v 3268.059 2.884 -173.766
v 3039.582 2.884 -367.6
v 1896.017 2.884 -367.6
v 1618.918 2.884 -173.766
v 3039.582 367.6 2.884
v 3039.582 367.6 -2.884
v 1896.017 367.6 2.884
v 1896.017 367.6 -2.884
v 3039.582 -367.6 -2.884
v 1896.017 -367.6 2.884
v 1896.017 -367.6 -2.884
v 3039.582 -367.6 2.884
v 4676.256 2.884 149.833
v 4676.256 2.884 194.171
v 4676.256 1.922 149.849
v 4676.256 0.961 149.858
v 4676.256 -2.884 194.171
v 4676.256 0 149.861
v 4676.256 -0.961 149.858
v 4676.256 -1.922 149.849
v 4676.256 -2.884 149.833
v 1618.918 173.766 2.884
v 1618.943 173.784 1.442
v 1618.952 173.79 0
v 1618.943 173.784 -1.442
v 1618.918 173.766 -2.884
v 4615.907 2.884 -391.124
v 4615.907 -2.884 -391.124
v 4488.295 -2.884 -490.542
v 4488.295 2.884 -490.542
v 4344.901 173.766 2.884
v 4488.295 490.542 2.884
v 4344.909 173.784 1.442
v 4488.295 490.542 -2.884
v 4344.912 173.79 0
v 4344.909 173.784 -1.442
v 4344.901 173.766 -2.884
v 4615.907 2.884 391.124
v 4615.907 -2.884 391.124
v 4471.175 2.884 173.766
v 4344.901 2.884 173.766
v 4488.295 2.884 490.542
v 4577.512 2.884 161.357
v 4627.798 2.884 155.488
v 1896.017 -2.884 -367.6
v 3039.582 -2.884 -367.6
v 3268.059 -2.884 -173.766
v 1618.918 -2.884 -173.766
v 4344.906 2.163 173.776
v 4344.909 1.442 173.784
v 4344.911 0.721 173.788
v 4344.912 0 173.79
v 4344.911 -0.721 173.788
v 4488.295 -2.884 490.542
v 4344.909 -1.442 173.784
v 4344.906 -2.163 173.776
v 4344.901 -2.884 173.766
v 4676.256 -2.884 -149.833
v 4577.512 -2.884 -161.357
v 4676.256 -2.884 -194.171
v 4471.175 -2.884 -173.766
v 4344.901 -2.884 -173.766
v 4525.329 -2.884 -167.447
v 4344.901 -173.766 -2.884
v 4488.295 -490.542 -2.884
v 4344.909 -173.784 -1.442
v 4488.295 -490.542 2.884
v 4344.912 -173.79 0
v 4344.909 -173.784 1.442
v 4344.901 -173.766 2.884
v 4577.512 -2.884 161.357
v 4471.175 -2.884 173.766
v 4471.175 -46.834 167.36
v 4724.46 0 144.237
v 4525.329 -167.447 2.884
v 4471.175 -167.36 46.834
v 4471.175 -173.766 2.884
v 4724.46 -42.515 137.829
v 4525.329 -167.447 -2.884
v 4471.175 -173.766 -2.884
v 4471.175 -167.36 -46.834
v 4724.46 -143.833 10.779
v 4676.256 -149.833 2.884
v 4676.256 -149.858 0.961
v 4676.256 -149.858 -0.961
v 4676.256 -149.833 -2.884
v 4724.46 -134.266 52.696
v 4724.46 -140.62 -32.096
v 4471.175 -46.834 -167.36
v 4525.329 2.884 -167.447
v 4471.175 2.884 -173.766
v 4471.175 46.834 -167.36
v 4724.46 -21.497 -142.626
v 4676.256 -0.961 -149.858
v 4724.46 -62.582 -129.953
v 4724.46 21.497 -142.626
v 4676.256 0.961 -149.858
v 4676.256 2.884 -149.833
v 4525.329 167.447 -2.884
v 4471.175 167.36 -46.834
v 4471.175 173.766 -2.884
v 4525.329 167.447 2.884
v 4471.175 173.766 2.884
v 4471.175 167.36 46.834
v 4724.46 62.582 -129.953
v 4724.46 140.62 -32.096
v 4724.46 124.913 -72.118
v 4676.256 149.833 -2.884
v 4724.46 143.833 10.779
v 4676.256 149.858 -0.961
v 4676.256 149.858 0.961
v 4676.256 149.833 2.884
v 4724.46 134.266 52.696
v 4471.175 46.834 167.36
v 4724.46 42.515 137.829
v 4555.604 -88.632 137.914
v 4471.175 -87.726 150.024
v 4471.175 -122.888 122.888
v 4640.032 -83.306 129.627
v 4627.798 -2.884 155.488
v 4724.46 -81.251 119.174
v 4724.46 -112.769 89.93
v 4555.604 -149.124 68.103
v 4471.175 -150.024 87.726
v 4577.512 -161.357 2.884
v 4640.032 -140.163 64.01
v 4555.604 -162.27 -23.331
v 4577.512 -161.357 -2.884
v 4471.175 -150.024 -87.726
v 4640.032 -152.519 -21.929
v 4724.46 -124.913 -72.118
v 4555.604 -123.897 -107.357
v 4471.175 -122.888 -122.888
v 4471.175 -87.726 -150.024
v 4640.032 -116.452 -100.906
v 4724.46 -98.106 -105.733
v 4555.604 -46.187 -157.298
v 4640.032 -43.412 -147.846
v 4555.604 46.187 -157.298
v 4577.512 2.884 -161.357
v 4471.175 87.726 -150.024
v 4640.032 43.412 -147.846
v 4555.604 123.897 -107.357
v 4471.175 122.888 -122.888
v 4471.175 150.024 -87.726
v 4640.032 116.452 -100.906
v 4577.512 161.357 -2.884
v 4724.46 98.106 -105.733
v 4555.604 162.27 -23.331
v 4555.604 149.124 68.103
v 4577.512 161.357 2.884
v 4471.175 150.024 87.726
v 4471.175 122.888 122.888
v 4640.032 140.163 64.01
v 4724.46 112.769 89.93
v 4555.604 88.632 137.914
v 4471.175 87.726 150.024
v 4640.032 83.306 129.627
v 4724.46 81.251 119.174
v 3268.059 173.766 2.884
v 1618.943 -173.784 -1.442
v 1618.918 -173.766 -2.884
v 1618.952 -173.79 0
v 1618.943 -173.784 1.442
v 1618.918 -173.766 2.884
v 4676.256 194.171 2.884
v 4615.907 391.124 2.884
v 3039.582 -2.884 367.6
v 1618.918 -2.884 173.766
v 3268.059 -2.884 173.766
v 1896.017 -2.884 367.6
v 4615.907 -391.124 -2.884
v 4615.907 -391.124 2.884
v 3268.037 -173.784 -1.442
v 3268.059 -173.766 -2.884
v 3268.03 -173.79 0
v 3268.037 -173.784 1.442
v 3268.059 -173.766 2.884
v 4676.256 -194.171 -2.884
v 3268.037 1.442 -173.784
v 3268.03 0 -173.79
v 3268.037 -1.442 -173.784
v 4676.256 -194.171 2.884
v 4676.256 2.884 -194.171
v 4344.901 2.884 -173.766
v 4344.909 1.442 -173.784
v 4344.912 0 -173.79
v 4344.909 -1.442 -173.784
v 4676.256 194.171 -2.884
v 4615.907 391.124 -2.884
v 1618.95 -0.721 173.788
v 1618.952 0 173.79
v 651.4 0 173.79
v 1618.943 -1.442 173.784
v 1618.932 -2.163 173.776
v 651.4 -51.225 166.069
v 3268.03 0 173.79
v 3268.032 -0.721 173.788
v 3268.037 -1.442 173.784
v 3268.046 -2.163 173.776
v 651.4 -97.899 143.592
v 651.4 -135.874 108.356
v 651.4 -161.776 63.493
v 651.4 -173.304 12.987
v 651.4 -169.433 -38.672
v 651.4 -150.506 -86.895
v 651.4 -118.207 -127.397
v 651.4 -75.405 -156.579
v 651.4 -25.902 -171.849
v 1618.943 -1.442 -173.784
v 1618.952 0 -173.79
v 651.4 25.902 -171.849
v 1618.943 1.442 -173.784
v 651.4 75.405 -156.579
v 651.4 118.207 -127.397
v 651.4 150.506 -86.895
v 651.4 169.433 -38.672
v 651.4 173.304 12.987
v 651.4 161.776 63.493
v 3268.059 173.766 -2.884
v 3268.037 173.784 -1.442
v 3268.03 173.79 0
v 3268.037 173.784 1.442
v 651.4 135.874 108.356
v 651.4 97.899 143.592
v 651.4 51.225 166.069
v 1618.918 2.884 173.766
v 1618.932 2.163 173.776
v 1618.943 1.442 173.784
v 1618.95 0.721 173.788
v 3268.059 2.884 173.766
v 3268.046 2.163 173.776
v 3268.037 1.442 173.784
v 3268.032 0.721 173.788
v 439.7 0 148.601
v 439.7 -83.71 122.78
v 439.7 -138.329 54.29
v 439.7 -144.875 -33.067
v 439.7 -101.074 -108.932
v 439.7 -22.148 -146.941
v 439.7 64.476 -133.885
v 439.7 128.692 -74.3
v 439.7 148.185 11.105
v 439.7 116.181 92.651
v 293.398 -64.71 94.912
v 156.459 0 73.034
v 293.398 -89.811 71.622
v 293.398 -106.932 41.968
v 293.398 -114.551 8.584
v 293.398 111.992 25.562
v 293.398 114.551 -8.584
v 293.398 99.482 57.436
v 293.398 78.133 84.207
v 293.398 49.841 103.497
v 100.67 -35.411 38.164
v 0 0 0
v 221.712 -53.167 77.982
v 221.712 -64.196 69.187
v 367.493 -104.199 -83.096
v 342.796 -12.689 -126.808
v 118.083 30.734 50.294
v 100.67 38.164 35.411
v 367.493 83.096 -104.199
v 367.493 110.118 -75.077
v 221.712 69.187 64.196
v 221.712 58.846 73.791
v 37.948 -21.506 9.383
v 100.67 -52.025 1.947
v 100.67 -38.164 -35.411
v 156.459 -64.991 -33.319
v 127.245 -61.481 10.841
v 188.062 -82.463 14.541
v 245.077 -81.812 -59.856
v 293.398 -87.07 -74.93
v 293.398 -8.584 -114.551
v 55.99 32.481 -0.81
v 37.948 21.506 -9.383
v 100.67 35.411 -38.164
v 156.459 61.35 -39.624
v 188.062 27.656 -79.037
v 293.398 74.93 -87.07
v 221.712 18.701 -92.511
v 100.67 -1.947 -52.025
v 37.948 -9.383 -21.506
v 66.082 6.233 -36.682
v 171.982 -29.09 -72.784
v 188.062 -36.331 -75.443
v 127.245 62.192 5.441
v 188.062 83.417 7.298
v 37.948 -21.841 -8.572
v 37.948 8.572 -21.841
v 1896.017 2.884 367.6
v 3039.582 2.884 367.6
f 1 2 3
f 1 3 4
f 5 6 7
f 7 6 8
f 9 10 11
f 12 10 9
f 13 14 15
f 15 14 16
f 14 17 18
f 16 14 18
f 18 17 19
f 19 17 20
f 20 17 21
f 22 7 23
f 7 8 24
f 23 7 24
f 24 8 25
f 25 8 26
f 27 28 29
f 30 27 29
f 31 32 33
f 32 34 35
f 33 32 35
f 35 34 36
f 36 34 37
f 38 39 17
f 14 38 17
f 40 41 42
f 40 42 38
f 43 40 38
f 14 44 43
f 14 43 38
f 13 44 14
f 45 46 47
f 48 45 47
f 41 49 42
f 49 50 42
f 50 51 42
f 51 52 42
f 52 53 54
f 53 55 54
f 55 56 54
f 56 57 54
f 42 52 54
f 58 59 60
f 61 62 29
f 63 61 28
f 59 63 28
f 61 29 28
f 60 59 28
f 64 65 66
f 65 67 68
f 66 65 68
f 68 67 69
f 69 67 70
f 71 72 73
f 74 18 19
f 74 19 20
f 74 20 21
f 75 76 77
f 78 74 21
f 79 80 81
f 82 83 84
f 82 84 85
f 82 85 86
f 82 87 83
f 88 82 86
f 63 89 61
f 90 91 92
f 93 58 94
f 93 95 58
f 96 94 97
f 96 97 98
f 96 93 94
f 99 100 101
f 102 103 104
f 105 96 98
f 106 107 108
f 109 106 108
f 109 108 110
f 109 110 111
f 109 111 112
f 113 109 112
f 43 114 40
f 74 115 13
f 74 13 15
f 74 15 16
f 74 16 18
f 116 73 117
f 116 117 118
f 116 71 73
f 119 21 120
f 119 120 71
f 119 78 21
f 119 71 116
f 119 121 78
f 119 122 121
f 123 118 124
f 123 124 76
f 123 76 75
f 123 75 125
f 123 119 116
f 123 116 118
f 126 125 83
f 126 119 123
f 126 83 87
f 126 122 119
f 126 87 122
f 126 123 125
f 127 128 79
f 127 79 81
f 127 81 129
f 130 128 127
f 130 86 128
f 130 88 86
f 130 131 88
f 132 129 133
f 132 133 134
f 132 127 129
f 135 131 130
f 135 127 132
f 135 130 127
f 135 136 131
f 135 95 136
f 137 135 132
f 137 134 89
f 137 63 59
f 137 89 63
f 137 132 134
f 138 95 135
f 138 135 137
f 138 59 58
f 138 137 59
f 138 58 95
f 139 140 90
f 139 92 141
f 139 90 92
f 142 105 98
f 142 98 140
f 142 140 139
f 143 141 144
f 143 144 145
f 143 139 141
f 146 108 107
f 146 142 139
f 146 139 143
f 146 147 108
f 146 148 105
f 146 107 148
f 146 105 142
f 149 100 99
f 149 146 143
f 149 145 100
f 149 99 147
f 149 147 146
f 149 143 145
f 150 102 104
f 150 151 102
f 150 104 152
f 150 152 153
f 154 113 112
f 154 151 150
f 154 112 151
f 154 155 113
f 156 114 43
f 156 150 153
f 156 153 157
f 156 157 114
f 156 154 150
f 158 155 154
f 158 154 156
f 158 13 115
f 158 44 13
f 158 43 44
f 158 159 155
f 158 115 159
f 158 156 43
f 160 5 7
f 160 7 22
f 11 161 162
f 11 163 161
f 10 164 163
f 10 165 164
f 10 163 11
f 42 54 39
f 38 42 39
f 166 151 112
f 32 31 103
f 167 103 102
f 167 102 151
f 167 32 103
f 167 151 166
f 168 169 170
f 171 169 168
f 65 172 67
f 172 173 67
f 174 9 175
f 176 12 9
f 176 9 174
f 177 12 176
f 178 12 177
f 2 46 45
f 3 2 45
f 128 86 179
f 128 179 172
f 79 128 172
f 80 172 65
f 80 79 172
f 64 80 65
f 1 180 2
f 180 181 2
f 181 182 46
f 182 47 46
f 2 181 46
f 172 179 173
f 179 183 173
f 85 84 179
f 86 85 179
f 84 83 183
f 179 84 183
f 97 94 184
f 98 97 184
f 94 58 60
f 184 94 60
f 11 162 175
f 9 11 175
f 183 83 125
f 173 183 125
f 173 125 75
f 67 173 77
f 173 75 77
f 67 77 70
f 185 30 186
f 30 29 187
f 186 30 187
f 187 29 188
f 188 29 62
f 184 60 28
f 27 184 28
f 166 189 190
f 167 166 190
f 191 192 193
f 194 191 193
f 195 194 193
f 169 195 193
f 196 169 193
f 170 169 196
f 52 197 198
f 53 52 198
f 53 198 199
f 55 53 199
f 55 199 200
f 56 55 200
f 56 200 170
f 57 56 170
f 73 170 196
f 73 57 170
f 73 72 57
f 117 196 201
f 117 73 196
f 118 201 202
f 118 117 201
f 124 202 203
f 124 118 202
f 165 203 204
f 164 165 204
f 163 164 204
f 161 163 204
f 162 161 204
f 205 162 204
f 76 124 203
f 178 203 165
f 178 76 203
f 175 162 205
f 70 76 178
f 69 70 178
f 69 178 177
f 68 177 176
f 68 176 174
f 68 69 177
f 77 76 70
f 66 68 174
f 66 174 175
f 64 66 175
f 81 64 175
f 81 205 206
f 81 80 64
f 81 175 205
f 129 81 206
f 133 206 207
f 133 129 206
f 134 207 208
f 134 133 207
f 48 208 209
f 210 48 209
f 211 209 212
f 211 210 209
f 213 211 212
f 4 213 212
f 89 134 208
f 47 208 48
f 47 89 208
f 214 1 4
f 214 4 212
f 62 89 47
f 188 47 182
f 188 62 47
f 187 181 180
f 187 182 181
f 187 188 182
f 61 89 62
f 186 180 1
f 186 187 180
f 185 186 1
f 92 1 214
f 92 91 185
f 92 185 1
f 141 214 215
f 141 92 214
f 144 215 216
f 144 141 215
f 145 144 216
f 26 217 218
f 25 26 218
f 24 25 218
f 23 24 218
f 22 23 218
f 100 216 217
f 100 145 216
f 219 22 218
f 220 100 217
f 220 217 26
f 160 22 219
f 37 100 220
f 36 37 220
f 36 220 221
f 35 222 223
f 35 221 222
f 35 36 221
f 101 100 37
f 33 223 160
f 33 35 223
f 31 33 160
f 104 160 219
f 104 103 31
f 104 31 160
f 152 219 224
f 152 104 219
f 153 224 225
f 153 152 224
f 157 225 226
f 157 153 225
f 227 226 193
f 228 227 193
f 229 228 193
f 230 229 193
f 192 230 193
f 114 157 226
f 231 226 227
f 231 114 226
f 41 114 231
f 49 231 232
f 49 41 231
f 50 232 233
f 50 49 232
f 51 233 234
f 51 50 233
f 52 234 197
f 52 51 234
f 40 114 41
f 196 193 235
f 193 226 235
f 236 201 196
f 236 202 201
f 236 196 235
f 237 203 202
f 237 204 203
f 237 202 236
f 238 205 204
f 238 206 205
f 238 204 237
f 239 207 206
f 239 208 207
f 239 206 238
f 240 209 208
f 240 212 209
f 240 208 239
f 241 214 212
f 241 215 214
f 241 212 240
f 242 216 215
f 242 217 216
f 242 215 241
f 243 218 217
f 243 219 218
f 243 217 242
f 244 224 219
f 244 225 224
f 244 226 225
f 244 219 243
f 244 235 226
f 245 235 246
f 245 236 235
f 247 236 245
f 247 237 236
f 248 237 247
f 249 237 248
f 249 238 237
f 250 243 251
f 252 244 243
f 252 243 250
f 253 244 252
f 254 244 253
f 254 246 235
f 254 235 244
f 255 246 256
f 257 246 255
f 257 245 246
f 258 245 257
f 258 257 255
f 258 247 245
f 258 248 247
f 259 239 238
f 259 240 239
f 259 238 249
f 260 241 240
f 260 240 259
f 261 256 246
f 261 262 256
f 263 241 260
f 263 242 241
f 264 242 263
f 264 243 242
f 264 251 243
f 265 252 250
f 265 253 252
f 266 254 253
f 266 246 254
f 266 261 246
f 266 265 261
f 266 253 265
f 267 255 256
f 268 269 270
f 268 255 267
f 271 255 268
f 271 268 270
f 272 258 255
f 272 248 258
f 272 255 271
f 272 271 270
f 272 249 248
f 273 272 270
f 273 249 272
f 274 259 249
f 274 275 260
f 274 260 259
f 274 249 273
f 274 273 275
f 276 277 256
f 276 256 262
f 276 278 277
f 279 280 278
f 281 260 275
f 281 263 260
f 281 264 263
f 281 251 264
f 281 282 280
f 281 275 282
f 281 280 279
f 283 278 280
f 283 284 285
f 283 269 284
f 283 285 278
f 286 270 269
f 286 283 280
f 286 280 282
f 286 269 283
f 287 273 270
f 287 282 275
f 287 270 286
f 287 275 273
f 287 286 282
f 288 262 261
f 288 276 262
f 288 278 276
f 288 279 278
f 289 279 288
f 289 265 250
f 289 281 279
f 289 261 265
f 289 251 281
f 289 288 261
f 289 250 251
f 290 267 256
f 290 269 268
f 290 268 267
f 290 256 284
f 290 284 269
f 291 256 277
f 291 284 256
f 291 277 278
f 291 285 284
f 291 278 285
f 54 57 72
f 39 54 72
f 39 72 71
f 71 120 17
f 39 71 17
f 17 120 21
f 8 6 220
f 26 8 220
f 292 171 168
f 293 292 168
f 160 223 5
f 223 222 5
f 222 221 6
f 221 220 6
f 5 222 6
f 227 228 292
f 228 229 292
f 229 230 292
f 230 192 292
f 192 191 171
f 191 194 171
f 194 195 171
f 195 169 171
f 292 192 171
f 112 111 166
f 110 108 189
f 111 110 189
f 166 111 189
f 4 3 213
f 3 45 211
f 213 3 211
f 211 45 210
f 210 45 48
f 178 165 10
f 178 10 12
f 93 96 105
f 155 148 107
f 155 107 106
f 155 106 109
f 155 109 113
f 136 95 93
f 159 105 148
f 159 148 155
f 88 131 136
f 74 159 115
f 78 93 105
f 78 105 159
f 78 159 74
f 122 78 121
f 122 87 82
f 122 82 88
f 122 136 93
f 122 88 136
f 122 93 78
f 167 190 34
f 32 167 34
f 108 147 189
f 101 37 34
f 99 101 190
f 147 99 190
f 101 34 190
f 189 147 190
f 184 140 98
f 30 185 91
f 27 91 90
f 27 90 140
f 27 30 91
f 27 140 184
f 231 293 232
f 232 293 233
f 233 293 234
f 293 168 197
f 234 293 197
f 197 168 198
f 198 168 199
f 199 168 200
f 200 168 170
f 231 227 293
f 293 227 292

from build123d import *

# Parameters (mm, degrees)
BOSS_EXTRUDE1_DEPTH   = 0.545404963
BOSS_EXTRUDE1_2_DEPTH = 0.545404963
SCALE2_SCALE          = 5.287
CIRPATTERN1_START     = 378.196965722
CIRPATTERN1_DEPTH     = 5.767112081
CIRPATTERN1_START_2   = -2.88355604
CIRPATTERN1_2_DEPTH   = 5.76711208


with BuildPart() as part:
    # Sketch1 → Revolve1 (revolve)
    with BuildSketch(Plane.XY, mode=Mode.PRIVATE) as revolve1_sk:
        with BuildLine():
            Line((152.219440928, 104.949962647), (874.703810113, 104.949962647))
            Line((874.703810113, 104.949962647), (922.610904161, 99.360176626))
            Line((922.610904161, 99.360176626), (922.610904161, 72.078782251))
            Line((922.610904161, 72.078782251), (29.011489455, 72.078782251))
            add(Edge.make_bspline(
                [(29.011489455, 72.078782251), (71.639201594, 104.949962647), (152.219440928, 104.949962647)],
                knots=[0, 0, 0, 1, 1, 1], degree=2, weights=[1, 0.474859473, 1]))
        make_face()
    revolve(revolve1_sk.sketch.rotate(Axis((29.011489455, 72.078782251, 0), (1, 0, 0)), 90), axis=Axis((29.011489455, 72.078782251, 0), (1, 0, 0)))


with BuildPart() as body_2:
    # Sketch2 → Boss-Extrude1 (new, symmetric)
    with BuildSketch(Plane.XY):
        Polygon((850.176909973, 50.048019845), (913.4933382, 50.048019845), (913.4933382, 35.352717878), (902.078807117, -1.899656367), (877.941925748, -20.703868936), (850.176909973, 40.632503532), align=None)
    extrude(amount=BOSS_EXTRUDE1_DEPTH, both=True)


with BuildPart() as body_3:
    # Sketch2 → Boss-Extrude1 2 (new, symmetric)
    with BuildSketch(Plane.XY):
        Polygon((333.188164698, 40.632503532), (387.630174448, 2.549802235), (603.927645349, 2.549802235), (648.816726438, 40.632503532), (648.816726438, 50.048019845), (333.188164698, 50.048019845), align=None)
    extrude(amount=BOSS_EXTRUDE1_2_DEPTH, both=True)


with BuildPart() as part_1:
    # Scale2: scaled about (0, 0, 0)
    add(part.part.scale(SCALE2_SCALE))

    # CirPattern1: read off the stored shape, not the designer's step
    # CirPattern1 outline → CirPattern1 (add)
    with BuildSketch(Plane(origin=(0, 0, 0), x_dir=(1, 0, 0), z_dir=(0, 1, 0)).offset(CIRPATTERN1_START)):
        Polygon((4419.626329355, 0), (4641.678961432, -490.541876827), (4769.290653226, -391.124004973), (4829.639279064, -194.170702341), (4829.639279064, 194.170702341), (4769.290653226, 391.124004973), (4641.678961432, 490.541876827), align=None)
        Polygon((3192.965460961, -367.599717344), (3626.264910808, 0), (3192.965460961, 367.599717344), (2049.400732307, 367.599717344), (1772.301251505, 173.766006848), (1771, 172.8557691), (1771, -172.8557691), (1772.301251505, -173.766006848), (2049.400732307, -367.599717344), align=None)
    extrude(amount=CIRPATTERN1_DEPTH)

    # CirPattern1 2 outline → CirPattern1 2 (add)
    with BuildSketch(Plane.XY.offset(CIRPATTERN1_START_2)):
        Polygon((4829.639279064, 377), (4829.639279064, 575.251224103), (4769.290653226, 772.204526736), (4641.678961432, 871.62239859), (4417.779207548, 377), align=None)
        Polygon((1771, 377), (3631.074729074, 377), (3192.965460961, 748.680239107), (2049.400732307, 748.680239107), (1772.301251505, 554.846528611), (1771, 553.936290863), align=None)
    extrude(amount=CIRPATTERN1_2_DEPTH)


with BuildPart() as body_3_1:
    # Scale2: scaled about (0, 0, 0)
    add(body_3.part.scale(SCALE2_SCALE))


with BuildPart() as body_2_1:
    # Scale2: scaled about (0, 0, 0)
    add(body_2.part.scale(SCALE2_SCALE))


with BuildPart() as part_2:
    add(part_1.part)

    # Combine1: union body 3, body 2
    add(body_3_1.part)
    add(body_2_1.part)


with BuildPart() as part_3:
    # Body-Move/Copy1: read off the stored shape, not the designer's step
    # Body-Move/Copy1: moved
    add(part_2.part.moved(Location((-153.3837447, -381.0805218, 0))))


solid = part_3.part
